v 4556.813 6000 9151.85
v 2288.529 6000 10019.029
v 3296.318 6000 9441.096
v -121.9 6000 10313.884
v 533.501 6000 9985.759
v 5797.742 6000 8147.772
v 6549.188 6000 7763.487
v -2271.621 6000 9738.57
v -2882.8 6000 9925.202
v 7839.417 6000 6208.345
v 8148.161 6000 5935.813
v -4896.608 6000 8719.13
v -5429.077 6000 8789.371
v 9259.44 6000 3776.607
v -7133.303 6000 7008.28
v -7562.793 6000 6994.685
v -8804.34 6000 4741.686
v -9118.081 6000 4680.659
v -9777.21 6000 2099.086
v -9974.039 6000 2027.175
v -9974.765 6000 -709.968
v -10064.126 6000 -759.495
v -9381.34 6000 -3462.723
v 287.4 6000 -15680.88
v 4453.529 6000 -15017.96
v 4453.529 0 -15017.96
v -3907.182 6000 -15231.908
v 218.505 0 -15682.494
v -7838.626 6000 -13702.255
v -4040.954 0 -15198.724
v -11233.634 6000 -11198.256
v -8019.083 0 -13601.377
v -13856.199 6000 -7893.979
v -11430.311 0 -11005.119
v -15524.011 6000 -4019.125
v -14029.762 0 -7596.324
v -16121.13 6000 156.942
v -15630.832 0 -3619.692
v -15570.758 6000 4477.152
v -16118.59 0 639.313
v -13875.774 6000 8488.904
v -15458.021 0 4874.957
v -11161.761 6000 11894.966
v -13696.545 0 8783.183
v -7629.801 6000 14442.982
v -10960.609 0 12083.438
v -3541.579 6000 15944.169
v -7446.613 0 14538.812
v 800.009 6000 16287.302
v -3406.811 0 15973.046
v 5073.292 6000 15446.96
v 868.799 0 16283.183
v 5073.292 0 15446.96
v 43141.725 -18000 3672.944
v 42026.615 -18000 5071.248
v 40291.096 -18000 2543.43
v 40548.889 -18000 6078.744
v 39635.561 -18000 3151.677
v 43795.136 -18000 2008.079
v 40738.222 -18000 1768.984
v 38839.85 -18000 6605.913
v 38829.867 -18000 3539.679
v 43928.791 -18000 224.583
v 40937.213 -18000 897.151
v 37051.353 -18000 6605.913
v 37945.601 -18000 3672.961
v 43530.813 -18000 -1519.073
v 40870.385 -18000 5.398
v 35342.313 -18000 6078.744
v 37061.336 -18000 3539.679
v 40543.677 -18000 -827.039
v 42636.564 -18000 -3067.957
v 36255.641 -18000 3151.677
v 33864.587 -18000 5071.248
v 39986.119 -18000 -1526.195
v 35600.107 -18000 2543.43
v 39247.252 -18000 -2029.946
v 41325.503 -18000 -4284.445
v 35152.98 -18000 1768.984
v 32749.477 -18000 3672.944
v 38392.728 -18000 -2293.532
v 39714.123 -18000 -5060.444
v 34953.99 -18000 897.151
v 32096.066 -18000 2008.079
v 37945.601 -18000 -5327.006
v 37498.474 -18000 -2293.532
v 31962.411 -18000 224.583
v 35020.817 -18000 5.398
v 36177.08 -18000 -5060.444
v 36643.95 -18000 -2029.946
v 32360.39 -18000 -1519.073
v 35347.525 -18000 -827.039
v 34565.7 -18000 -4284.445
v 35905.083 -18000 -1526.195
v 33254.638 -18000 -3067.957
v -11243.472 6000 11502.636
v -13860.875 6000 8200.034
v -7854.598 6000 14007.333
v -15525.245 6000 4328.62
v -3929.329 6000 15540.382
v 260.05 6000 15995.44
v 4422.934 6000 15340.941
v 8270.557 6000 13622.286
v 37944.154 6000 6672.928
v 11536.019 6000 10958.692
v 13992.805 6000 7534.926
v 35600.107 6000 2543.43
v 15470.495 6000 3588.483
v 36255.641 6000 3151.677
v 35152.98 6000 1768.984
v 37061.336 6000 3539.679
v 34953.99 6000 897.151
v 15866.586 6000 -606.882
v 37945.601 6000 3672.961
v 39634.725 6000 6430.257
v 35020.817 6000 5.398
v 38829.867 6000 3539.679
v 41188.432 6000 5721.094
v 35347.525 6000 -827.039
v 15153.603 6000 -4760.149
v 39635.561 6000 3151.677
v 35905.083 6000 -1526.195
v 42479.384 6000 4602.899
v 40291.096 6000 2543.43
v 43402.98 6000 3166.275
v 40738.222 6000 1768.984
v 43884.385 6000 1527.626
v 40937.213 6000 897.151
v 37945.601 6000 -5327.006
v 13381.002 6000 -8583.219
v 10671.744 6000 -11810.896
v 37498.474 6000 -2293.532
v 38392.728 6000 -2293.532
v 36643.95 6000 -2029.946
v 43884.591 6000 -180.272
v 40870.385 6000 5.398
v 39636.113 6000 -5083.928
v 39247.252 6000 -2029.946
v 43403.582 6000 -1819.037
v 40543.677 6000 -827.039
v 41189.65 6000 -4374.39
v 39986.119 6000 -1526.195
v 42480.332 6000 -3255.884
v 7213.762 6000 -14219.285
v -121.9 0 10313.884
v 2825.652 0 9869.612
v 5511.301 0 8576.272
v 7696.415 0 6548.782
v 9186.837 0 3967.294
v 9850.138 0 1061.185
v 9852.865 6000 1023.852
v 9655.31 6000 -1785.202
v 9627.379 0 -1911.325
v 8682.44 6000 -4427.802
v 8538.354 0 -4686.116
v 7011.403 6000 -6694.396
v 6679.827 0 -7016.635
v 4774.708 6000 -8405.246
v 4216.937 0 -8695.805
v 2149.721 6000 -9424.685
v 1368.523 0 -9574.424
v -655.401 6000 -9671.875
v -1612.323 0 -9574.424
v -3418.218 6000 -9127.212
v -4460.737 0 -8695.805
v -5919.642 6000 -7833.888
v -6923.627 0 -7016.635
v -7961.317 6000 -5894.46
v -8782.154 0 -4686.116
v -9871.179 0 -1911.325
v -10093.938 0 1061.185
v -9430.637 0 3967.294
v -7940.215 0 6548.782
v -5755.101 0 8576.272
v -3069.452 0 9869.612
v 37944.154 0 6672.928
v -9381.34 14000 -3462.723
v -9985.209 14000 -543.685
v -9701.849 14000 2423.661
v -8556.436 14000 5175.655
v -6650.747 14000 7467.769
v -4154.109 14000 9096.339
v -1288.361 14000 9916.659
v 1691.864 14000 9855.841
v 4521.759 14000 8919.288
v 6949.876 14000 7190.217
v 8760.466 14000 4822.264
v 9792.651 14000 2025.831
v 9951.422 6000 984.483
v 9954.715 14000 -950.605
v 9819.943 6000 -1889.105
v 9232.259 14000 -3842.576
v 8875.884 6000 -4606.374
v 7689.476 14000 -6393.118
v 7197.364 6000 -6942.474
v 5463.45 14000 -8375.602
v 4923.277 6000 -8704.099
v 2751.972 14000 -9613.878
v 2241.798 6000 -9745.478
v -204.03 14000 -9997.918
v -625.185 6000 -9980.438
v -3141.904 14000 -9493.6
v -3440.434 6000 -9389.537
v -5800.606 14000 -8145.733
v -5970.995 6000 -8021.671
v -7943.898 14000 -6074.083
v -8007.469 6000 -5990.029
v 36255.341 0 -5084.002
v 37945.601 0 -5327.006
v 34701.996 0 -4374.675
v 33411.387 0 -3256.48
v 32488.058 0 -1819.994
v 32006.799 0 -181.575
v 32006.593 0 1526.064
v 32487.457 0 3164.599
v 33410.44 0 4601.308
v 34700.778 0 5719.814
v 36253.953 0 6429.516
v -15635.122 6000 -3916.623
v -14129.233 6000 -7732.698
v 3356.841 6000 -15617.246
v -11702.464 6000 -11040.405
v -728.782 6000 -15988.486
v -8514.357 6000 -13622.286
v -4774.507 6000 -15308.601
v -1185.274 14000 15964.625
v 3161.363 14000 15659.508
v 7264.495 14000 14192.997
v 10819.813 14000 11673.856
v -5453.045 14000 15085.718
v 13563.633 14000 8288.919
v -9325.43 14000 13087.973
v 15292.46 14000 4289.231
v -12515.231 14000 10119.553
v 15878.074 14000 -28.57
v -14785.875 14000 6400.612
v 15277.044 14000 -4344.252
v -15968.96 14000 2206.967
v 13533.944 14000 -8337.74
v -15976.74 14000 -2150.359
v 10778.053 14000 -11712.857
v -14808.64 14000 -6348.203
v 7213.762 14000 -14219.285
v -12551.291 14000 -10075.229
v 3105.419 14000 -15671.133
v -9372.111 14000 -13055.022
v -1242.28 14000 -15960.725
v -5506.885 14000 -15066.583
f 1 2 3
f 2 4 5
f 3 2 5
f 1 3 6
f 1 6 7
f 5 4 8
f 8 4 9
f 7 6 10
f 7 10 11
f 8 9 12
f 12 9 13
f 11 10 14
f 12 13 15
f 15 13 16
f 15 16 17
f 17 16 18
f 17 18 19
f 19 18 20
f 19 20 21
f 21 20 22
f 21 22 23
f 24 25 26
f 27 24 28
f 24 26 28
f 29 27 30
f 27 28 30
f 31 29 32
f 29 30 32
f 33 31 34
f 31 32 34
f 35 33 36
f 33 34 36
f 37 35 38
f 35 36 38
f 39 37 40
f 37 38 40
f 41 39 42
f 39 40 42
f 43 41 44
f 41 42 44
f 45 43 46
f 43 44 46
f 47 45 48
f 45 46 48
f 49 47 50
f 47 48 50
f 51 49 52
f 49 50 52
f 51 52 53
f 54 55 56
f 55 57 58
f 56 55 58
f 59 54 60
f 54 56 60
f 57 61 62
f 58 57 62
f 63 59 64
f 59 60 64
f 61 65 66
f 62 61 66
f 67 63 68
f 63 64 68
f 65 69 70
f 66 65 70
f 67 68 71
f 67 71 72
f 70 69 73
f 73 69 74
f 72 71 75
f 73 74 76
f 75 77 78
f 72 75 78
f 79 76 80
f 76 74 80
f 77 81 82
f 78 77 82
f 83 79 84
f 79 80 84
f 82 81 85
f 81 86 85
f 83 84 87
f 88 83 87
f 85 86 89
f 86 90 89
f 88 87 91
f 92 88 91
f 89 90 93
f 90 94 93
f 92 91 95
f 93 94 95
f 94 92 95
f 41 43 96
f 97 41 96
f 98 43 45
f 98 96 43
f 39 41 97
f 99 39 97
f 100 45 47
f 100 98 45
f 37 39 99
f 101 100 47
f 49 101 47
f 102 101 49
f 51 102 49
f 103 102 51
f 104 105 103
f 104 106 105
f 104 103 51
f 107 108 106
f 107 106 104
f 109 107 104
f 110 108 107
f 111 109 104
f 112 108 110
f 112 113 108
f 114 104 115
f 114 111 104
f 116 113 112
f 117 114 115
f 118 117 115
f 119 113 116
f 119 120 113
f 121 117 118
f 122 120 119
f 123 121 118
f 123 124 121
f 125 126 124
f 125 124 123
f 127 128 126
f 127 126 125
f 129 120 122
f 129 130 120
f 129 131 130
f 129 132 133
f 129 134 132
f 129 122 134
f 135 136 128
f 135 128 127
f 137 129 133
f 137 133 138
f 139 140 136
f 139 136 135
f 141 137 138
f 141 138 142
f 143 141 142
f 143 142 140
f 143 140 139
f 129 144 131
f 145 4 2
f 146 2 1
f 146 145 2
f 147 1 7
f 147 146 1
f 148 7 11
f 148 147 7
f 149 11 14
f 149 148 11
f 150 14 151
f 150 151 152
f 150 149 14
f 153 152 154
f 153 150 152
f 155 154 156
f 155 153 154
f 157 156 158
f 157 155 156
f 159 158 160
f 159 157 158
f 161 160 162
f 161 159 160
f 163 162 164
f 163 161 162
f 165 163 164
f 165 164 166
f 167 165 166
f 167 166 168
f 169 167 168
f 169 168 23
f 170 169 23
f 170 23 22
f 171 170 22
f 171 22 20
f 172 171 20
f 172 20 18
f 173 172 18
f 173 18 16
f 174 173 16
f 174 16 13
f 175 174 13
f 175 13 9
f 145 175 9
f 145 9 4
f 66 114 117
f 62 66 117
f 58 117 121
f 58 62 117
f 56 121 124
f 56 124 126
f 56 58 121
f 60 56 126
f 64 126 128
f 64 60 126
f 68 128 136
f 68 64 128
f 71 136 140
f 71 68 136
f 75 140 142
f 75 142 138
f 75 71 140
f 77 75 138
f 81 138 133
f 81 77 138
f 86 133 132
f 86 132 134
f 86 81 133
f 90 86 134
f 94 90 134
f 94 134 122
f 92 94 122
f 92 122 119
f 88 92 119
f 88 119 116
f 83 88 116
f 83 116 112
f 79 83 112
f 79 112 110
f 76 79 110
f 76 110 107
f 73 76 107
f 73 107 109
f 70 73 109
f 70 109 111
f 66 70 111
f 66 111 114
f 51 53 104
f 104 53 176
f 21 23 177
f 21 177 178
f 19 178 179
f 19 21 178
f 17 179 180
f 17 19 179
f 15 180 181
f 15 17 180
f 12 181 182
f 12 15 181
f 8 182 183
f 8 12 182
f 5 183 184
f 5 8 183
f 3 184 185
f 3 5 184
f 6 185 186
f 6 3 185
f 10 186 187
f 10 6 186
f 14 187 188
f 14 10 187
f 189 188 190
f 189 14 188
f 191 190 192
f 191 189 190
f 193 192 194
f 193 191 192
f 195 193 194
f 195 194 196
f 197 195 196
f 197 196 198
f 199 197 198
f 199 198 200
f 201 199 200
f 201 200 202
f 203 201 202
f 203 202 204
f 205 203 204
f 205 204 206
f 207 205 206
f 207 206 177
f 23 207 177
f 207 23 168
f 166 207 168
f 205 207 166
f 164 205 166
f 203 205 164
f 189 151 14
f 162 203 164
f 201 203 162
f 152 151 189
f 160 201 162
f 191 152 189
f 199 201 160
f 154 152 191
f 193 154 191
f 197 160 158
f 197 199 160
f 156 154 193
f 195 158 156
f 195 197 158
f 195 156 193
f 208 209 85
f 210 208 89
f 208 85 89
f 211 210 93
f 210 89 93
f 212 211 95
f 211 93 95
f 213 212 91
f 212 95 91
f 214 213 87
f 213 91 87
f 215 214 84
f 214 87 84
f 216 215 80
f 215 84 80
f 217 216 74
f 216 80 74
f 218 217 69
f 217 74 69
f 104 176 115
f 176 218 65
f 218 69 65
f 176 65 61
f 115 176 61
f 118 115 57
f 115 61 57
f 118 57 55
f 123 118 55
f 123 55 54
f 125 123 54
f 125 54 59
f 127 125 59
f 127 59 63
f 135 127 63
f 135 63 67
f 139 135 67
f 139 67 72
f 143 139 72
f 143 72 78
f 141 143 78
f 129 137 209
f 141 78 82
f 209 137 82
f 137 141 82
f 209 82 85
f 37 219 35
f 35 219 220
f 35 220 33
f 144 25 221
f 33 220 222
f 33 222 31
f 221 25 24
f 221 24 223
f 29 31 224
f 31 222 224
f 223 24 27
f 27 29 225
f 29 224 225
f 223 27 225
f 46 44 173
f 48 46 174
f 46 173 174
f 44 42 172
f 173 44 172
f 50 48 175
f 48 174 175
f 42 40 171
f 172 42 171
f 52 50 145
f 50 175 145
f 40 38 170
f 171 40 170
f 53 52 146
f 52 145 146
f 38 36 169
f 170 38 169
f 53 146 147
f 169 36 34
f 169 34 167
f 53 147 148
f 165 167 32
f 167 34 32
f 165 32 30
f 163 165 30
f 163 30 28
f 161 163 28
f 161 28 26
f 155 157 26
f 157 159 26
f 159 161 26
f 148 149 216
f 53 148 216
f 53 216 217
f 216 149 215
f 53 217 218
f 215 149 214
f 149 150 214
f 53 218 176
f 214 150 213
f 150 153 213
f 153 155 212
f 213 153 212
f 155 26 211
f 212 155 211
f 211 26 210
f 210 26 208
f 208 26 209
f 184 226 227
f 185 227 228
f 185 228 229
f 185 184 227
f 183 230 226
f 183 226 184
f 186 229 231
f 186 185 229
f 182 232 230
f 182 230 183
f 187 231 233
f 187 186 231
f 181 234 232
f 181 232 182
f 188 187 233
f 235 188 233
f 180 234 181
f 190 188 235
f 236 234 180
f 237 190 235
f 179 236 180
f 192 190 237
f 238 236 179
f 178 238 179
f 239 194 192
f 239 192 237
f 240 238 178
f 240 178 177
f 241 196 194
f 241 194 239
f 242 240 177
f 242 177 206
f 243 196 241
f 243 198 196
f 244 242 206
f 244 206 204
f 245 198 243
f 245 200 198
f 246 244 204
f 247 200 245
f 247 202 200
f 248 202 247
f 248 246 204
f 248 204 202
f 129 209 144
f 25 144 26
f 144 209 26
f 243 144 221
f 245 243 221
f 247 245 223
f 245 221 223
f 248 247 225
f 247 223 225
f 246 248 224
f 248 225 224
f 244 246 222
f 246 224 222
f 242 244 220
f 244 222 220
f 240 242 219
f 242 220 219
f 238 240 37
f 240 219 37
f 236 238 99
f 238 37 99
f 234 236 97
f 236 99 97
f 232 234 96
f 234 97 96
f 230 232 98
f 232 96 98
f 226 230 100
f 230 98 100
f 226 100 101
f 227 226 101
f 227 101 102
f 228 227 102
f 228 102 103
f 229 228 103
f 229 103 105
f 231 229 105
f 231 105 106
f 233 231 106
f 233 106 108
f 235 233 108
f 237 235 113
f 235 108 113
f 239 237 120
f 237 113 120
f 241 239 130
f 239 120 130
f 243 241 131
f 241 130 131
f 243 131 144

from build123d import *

# Parameters (mm, degrees)
SKETCH2_R            = 3000.000000003
SKETCH2_R_2          = 10000
BOSS_EXTRUDE8_DEPTH  = 6000
SKETCH8_R            = 16000
SKETCH8_R_2          = 10000
BOSS_EXTRUDE9_DEPTH  = 8000
BOSS_EXTRUDE10_START = -24000
SKETCH13_R           = 5999.966921828
SKETCH13_R_2         = 3000.000000003
BOSS_EXTRUDE10_DEPTH = 24000


with BuildPart() as part:
    # Sketch2 → Boss-Extrude8 (new body)
    with BuildSketch(Plane(origin=(0, 0, 0), x_dir=(1, 0, 0), z_dir=(0, 1, 0))):
        with BuildLine():
            Line((5073.292105113, -15446.959810122), (37944.154117519, -6672.927533003))
            ThreePointArc((37944.154117519, -6672.927533003), (43945.568107908, -673.684341785), (37945.601229707, 5327.006136143))
            Line((37945.601229707, 5327.00613614), (4453.528698309, 15017.960239361))
            ThreePointArc((4453.528698309, 15017.960239361), (-16118.590155227, -639.312973304), (5073.292105113, -15446.959810122))
        make_face()
        with Locations(Location((37945.601229707, -672.960785686, 0), (0, 0, 270))):
            Circle(SKETCH2_R, mode=Mode.SUBTRACT)
        with Locations(Location((-121.899995114, -313.884146472, 0), (0, 0, 270))):
            Circle(SKETCH2_R_2, mode=Mode.SUBTRACT)
    extrude(amount=BOSS_EXTRUDE8_DEPTH)

    # Sketch8 → Boss-Extrude9 (add)
    with BuildSketch(Plane(origin=(0, 6000, 0), x_dir=(1, 0, 0), z_dir=(0, 1, 0))):
        with Locations(Location((-121.899995114, 0, 0), (0, 0, 62.711003457))):
            Circle(SKETCH8_R)
        with Locations(Location((0, 0, 0), (0, 0, 159.740517699))):
            Circle(SKETCH8_R_2, mode=Mode.SUBTRACT)
    extrude(amount=BOSS_EXTRUDE9_DEPTH)

    # Sketch13 → Boss-Extrude10 (add)
    with BuildSketch(Plane(origin=(0, 6000, 0), x_dir=(1, 0, 0), z_dir=(0, 1, 0)).offset(BOSS_EXTRUDE10_START)):
        with Locations(Location((37945.601229707, -672.960785686, 0), (0, 0, 90))):
            Circle(SKETCH13_R)
        with Locations(Location((37945.601229707, -672.960785686, 0), (0, 0, 270))):
            Circle(SKETCH13_R_2, mode=Mode.SUBTRACT)
    extrude(amount=BOSS_EXTRUDE10_DEPTH)


solid = part.part
